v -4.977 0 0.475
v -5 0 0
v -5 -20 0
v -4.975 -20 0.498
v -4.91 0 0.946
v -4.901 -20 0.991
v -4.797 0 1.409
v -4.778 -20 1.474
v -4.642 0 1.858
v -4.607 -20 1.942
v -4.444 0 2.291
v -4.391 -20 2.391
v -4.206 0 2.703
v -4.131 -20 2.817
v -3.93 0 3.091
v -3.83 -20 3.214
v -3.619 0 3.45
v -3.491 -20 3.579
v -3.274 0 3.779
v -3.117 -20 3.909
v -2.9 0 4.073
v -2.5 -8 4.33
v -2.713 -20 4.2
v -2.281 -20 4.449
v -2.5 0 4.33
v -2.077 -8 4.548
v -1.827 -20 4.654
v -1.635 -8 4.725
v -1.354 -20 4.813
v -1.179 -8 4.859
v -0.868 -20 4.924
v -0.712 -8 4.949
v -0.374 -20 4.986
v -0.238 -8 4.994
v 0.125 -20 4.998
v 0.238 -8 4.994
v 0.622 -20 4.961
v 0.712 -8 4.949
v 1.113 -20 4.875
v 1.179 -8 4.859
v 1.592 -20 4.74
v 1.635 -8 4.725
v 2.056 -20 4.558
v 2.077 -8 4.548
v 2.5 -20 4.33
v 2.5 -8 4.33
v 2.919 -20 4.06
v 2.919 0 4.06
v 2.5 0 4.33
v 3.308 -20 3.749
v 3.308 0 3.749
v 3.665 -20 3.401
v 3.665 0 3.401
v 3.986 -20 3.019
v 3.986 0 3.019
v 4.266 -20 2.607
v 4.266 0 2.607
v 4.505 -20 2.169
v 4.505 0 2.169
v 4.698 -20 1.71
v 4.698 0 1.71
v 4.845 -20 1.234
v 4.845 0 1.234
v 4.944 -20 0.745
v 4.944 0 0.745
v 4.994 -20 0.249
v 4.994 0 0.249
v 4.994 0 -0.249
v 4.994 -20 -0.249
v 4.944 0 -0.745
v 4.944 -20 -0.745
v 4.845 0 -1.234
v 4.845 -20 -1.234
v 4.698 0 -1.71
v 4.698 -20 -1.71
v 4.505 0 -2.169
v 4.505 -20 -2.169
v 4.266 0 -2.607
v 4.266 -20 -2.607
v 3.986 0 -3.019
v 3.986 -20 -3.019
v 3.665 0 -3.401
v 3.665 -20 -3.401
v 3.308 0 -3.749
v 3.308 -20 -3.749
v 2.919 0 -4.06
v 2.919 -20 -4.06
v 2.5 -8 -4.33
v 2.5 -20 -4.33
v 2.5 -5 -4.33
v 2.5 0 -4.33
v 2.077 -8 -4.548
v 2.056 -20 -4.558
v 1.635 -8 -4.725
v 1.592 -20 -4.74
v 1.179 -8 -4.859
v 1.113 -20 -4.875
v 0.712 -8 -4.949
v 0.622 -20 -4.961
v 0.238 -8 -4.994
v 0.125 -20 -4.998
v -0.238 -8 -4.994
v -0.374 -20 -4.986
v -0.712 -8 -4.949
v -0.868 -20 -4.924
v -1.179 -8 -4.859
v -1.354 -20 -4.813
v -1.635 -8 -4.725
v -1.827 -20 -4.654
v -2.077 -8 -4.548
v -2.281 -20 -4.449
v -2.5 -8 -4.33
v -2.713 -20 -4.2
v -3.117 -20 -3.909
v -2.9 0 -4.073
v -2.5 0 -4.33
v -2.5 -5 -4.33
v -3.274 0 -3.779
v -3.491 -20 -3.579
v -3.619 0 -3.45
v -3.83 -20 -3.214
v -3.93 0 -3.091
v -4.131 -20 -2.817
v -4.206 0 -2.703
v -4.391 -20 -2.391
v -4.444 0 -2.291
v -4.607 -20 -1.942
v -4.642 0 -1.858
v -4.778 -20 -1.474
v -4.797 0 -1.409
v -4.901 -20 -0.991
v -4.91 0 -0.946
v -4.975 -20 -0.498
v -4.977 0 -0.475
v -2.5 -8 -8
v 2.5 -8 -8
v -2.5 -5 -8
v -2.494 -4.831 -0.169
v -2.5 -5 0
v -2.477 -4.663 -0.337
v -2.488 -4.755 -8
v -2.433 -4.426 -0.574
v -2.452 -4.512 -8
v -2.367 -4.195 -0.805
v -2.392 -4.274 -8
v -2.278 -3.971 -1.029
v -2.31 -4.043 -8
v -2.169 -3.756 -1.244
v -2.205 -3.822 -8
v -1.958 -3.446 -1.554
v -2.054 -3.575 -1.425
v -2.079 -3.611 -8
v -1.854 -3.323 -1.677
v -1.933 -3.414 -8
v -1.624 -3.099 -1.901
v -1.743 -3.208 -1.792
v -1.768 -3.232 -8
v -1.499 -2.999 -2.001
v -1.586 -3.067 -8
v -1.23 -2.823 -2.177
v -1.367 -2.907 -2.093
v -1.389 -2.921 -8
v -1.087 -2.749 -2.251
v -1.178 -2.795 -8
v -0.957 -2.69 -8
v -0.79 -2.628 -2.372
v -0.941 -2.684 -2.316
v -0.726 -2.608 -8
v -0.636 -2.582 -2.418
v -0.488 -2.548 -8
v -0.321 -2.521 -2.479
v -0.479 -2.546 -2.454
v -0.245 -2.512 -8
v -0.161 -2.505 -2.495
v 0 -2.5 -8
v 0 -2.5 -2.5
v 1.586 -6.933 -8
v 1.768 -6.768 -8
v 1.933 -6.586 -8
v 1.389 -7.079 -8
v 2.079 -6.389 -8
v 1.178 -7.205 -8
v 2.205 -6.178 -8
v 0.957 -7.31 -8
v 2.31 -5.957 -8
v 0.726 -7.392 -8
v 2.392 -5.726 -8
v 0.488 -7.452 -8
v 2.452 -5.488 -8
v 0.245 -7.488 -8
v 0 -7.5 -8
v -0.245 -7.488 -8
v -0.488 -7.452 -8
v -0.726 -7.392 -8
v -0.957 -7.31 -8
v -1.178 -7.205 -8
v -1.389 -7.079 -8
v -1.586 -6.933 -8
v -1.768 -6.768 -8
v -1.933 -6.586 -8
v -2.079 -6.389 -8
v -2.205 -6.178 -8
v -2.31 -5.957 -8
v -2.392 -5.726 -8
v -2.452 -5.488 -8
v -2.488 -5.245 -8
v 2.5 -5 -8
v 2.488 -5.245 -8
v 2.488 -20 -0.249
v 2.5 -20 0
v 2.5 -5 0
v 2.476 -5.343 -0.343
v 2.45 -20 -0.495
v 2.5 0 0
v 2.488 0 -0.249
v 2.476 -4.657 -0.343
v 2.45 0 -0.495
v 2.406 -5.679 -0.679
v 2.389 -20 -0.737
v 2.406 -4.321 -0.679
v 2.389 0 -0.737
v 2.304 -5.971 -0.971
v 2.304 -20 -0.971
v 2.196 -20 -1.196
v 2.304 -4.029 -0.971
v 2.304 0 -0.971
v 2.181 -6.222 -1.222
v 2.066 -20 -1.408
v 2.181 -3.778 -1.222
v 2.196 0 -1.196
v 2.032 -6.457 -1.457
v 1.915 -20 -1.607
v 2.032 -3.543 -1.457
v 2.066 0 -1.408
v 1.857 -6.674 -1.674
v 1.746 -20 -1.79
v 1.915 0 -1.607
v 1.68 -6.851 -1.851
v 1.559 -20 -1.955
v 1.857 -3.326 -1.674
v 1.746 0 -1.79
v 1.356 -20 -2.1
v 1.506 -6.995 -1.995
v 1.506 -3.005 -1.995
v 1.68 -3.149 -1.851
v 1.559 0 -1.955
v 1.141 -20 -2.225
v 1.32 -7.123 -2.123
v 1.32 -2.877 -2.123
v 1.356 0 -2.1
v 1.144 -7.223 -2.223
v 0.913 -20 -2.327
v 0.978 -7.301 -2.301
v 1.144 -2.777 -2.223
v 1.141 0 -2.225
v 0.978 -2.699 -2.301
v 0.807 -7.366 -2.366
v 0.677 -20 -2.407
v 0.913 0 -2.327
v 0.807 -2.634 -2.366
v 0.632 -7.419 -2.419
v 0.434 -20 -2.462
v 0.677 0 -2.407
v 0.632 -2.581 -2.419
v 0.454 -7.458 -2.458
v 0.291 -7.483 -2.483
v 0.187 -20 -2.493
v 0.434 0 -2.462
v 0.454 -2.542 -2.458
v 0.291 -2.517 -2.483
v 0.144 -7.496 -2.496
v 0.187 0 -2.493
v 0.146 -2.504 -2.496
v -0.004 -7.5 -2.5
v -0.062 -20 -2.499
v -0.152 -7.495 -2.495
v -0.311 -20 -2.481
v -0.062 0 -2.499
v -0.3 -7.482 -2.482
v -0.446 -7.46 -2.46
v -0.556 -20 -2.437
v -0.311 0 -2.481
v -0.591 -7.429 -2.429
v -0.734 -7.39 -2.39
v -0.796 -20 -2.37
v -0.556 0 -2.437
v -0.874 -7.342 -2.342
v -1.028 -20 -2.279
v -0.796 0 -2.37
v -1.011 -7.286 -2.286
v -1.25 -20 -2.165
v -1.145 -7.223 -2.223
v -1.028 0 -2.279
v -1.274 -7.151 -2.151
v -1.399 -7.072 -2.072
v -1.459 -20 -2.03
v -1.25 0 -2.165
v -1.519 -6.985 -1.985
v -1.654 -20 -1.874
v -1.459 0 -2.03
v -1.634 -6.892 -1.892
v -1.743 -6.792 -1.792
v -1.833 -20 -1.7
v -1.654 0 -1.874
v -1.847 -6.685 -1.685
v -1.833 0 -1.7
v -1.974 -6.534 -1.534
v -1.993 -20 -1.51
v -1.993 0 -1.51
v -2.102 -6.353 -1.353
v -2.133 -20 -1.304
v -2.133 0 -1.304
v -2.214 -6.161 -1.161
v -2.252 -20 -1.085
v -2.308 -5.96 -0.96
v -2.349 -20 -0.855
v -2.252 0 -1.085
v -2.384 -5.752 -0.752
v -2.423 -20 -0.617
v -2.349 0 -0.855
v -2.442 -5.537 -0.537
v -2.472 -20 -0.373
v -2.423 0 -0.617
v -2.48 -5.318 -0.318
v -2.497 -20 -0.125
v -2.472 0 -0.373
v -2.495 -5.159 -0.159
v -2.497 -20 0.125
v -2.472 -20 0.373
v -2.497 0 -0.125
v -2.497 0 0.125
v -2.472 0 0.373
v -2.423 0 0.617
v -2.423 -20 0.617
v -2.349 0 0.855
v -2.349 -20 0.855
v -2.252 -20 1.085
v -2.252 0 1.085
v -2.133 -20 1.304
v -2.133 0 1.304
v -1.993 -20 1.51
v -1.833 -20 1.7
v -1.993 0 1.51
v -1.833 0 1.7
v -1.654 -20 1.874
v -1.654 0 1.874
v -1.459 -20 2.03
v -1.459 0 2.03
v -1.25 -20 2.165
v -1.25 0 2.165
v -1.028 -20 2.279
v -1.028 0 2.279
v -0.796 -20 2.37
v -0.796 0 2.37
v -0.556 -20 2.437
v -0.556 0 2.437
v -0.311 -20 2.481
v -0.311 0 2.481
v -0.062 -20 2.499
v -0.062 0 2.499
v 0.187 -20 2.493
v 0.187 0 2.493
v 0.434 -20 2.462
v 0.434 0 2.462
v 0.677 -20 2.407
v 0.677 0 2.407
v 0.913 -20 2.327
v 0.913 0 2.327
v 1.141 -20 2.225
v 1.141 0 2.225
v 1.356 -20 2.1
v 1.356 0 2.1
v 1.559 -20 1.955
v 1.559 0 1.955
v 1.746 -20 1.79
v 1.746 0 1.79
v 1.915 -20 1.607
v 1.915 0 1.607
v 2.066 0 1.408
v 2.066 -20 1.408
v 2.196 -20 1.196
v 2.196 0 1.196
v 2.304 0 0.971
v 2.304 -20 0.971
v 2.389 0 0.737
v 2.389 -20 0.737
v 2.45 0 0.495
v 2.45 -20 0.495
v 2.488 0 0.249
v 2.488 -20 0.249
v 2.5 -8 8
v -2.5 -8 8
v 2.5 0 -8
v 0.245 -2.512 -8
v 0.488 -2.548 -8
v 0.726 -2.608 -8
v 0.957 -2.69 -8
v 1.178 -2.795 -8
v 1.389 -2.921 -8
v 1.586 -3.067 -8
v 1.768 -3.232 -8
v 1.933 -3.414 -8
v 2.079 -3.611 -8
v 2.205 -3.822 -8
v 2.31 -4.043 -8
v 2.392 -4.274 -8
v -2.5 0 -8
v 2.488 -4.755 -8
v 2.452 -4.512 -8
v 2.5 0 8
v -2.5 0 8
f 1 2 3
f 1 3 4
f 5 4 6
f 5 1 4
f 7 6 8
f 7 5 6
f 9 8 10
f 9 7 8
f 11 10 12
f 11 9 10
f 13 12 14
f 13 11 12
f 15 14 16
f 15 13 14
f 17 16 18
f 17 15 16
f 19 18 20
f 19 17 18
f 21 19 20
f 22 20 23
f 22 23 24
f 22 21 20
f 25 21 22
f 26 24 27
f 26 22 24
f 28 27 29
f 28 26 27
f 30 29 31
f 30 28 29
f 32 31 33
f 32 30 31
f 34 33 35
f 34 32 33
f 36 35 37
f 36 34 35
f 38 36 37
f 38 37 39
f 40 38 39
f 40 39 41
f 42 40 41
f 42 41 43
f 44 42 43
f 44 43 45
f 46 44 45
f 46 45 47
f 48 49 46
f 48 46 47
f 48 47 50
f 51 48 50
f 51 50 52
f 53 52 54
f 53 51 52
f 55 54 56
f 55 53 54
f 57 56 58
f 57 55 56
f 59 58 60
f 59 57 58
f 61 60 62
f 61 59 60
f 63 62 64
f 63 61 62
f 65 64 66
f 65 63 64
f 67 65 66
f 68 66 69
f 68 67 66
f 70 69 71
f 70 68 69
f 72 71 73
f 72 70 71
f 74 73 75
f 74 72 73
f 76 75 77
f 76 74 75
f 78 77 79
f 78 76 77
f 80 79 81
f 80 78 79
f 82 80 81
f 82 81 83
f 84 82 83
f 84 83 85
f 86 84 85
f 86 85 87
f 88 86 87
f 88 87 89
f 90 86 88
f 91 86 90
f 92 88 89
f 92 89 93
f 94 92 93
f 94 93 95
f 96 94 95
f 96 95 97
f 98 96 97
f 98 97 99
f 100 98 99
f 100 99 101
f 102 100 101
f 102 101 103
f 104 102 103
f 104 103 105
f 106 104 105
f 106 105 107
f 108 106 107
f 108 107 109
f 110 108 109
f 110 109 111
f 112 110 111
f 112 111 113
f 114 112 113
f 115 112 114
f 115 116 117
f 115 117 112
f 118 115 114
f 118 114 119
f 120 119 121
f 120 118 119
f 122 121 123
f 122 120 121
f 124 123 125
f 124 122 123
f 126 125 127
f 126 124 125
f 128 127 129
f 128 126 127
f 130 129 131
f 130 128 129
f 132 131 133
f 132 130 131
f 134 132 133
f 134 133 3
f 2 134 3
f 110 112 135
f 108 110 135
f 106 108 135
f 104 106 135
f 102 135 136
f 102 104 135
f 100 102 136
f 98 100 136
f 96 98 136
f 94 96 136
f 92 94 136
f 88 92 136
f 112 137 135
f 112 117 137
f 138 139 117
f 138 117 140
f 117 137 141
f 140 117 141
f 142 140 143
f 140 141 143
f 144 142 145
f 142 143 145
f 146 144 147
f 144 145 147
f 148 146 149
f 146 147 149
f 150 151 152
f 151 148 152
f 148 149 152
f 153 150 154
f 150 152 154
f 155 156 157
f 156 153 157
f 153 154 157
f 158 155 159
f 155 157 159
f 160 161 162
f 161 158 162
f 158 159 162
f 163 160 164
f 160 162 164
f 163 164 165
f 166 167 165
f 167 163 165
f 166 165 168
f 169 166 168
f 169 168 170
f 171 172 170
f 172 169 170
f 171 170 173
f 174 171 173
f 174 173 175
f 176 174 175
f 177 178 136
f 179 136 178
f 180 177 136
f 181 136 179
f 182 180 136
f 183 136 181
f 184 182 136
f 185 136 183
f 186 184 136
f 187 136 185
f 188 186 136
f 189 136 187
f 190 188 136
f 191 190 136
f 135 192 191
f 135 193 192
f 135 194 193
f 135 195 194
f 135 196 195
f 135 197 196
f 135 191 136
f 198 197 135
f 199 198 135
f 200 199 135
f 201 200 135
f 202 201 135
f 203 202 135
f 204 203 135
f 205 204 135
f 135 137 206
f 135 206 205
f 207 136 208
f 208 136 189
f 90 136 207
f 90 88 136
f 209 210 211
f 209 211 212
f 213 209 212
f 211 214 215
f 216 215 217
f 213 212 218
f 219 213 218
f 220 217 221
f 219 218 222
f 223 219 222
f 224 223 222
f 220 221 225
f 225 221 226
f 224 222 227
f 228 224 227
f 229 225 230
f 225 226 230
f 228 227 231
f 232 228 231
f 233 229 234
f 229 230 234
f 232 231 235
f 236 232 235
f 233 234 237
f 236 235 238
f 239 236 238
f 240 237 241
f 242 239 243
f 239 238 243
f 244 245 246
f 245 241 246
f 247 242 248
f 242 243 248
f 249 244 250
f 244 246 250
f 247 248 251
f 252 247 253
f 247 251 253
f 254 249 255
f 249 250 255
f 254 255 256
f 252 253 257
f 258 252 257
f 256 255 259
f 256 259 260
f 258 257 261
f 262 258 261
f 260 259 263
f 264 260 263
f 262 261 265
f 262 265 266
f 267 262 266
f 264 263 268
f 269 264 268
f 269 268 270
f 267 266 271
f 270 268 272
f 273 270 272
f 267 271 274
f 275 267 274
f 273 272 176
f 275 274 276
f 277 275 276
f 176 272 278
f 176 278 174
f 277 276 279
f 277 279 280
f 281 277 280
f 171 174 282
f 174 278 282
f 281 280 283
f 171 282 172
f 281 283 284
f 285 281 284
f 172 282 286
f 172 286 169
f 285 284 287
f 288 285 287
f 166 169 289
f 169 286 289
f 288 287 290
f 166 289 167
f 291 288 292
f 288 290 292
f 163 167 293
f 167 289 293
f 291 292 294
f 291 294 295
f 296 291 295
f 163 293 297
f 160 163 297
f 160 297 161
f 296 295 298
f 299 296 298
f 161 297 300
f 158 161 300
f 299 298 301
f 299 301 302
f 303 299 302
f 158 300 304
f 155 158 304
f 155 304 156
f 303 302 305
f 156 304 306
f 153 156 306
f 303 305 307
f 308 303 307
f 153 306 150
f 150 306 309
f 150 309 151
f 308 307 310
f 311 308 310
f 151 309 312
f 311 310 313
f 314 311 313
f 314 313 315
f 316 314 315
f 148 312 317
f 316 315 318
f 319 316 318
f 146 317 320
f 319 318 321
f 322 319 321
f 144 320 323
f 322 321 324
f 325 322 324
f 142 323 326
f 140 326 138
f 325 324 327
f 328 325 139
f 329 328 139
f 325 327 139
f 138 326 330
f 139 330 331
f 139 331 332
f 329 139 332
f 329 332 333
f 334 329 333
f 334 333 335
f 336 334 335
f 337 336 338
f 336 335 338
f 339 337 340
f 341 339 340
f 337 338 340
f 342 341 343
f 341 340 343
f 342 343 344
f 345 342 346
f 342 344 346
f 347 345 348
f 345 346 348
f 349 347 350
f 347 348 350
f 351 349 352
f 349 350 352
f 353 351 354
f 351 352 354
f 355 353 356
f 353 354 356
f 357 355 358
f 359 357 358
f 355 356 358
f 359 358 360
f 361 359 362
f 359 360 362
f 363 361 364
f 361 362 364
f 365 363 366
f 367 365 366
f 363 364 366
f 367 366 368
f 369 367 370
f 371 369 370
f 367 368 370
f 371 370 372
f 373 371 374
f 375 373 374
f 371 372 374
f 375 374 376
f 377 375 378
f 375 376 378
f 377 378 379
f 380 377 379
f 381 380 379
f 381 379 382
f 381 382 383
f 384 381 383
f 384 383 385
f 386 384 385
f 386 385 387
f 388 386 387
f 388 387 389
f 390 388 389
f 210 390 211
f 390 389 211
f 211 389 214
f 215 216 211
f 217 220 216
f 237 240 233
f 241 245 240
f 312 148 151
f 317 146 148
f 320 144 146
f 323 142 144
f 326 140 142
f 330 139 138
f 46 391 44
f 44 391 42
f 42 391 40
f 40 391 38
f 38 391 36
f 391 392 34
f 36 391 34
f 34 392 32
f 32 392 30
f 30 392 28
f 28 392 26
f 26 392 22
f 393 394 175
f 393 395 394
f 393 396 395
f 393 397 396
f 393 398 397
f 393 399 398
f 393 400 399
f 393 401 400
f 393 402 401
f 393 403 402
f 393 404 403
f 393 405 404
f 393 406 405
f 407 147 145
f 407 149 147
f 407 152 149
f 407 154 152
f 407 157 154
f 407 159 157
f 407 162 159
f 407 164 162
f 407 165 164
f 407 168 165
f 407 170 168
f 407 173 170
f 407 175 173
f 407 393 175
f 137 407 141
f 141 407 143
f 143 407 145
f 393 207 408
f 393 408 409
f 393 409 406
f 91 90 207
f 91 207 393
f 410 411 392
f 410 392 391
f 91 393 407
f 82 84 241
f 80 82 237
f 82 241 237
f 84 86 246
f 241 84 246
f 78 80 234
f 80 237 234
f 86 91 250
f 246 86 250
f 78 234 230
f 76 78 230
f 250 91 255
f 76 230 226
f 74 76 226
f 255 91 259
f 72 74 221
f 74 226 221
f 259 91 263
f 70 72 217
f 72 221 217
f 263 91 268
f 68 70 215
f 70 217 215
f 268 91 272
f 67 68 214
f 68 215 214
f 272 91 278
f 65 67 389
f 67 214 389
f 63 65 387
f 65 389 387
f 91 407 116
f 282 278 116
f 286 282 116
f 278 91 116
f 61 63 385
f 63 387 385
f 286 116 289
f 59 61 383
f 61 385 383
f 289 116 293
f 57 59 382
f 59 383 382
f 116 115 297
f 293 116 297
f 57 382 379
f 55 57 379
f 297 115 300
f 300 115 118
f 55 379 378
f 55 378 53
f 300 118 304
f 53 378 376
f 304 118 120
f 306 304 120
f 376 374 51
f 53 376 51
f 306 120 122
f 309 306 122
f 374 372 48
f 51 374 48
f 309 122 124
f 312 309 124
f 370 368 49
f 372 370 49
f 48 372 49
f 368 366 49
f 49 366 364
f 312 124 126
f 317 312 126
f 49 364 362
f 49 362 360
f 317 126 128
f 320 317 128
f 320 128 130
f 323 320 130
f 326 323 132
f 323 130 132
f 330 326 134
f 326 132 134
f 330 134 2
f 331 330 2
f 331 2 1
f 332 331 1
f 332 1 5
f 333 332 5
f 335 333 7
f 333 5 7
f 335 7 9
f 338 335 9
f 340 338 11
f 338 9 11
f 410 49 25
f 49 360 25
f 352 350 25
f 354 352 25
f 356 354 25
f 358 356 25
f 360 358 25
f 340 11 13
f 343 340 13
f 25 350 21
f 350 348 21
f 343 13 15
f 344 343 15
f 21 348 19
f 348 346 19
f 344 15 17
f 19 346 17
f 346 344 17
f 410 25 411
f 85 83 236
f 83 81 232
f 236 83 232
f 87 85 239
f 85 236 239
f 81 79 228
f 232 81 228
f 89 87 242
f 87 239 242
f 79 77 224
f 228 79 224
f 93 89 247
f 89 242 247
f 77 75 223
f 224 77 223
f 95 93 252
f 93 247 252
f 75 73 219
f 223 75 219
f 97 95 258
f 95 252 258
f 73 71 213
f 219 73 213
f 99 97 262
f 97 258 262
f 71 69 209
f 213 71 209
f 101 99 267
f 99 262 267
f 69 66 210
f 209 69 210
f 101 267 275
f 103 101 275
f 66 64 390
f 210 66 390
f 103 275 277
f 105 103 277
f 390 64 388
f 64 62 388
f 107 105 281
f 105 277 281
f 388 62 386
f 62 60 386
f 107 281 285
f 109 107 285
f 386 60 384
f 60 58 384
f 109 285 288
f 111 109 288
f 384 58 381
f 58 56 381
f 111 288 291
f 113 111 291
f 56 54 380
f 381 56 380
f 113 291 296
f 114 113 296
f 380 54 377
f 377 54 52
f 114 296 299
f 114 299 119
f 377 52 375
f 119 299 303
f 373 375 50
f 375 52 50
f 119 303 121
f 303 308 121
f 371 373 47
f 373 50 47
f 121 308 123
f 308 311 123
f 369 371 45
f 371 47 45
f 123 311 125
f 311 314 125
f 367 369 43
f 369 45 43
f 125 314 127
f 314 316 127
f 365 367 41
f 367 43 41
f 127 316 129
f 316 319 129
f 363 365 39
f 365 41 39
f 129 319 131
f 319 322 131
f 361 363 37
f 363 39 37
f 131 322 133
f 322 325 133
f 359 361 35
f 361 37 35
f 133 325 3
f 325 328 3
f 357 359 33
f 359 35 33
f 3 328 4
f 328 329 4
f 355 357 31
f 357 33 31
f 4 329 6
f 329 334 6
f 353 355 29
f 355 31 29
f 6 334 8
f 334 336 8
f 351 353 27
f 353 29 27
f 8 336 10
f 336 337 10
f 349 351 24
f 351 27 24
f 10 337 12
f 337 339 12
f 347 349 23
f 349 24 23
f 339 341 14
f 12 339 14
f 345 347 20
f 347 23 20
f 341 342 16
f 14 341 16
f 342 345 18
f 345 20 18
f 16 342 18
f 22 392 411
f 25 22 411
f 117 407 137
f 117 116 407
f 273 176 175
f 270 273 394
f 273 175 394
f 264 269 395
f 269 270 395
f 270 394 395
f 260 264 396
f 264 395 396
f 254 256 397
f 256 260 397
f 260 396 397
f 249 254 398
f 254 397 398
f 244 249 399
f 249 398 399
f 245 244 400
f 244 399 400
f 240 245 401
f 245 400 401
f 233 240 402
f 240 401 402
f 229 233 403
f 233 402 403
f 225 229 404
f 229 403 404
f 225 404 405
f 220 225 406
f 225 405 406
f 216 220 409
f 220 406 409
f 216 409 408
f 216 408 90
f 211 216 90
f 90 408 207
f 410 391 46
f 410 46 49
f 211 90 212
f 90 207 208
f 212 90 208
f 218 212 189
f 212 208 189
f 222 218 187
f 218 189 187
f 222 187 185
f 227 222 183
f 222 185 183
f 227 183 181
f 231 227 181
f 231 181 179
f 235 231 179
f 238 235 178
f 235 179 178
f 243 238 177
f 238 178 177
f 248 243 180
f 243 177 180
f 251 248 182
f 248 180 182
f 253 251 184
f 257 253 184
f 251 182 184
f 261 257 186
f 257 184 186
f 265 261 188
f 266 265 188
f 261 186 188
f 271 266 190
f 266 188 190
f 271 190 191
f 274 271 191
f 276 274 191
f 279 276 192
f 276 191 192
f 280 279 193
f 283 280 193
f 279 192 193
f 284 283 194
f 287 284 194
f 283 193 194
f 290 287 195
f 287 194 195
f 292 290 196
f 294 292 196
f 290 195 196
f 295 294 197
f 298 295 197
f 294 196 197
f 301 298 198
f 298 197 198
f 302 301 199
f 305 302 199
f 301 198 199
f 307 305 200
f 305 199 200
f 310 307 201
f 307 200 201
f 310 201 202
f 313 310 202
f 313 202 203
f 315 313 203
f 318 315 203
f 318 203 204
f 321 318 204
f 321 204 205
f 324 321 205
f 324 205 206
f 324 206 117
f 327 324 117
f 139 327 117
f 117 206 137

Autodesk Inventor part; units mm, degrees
ref_plane "YZ Plane" through (0, 0, 0) normal (1, 0, 0) x (0, 1, 0)
ref_plane "XZ Plane" through (0, 0, 0) normal (0, 1, 0) x (-1, 0, 0)
ref_plane "XY Plane" through (0, 0, 0) normal (0, 0, 1) x (1, 0, 0)
sketch "Sketch1" plane through (0, 0, 0) normal (0, 1, 0) x (-1, 0, 0)
  circle A0 centre (0, 0) radius 5
  dimension "d0" = 10
extrude "Extrusion1" add sketch "Sketch1" against normal blind 20
sketch "Sketch2" plane through (0, 0, 0) normal (1, 0, 0) x (0, 1, 0)
  line L0 (0, 0) -> (-8, 0)
  line L1 (-8, 0) -> (-8, 5)
  line L2 (-8, 5) -> (0, 5)
  line L3 (0, 5) -> (0, 0)
  line L4 (-8, 5) -> (0, 5)
  line L5 (0, 5) -> (0, 10)
  line L6 (0, 10) -> (-8, 10)
  line L7 (-8, 10) -> (-8, 5)
  line L8 (0, -5) -> (0, 5) projected
  line L9 (0, -5) -> (-8, -5)
  line L10 (-8, -5) -> (-8, -10)
  line L11 (-8, -10) -> (0, -10)
  line L12 (0, -10) -> (0, -5)
  dimension "d3" = 8
  dimension "d4" = 5
  dimension "d5" = 8
  dimension "d6" = 5
  dimension "d7" = 5
extrude "Extrusion2" add sketch "Sketch2" along normal mid plane 5 contours L12 L11 L10 L9 | L2 L7 L6 L5
sketch "Sketch3" plane through (-2.5, -8, 10) normal (0, 0, 1) x (1, 0, 0)
  line L0 (2.5, 0) -> (0, 0) projected
  line L1 (2.5, 8) -> (5, 8) projected
  line L2 (0, 0) -> (5, 0)
  line L3 (5, 0) -> (5, 8)
  line L4 (5, 8) -> (0, 8)
  line L5 (0, 8) -> (0, 0)
extrude "Extrusion3" add sketch "Sketch3" against normal blind 20
sketch "Sketch4" plane through (0, 0, 0) normal (0, 1, 0) x (1, 0, 0)
  circle A0 centre (0, 0) radius 2.5
  dimension "d12" = 5
extrude "Extrusion4" cut sketch "Sketch4" against normal through all
sketch "Sketch5" plane through (2.5, 0, -10) normal (0, 0, -1) x (-1, 0, 0)
  line L0 (2.5, 0) -> (2.5, -5)
  circle A0 centre (2.5, -5) radius 2.5
  line L1 (0, 0) -> (0, -20) projected
  dimension "d15" = 5
extrude "Extrusion5" cut sketch "Sketch5" against normal blind 10
thread "Thread1" size "M5x0.8" class "6H" standard "ANSI Metric M Profile" length 70
sketch "Sketch6" plane through (-2.5, -8, 10) normal (0, 0, 1) x (1, 0, 0)
  line L0 (0, 0) -> (5, 0) projected
  line L1 (5, 8) -> (5, 0) projected
  line L2 (0, 0) -> (5, 0)
  line L3 (5, 0) -> (5, 8)
  line L4 (5, 8) -> (0, 8)
  line L5 (0, 8) -> (0, 0)
  point P0 (2.5, 8)
extrude "Extrusion6" cut sketch "Sketch6" against normal blind 2
sketch "Sketch7" plane through (2.5, 0, -10) normal (0, 0, -1) x (-1, 0, 0)
  line L0 (5, -8) -> (5, 0) projected
  line L1 (0, 0) -> (5, 0)
  line L2 (5, 0) -> (5, -8)
  line L3 (5, -8) -> (0, -8)
  line L4 (0, -8) -> (0, 0)
  point P0 (2.5, 0)
extrude "Extrusion7" cut sketch "Sketch7" against normal blind 2
properties part number "azimuth_gear_in" material "Aluminum 6061"
